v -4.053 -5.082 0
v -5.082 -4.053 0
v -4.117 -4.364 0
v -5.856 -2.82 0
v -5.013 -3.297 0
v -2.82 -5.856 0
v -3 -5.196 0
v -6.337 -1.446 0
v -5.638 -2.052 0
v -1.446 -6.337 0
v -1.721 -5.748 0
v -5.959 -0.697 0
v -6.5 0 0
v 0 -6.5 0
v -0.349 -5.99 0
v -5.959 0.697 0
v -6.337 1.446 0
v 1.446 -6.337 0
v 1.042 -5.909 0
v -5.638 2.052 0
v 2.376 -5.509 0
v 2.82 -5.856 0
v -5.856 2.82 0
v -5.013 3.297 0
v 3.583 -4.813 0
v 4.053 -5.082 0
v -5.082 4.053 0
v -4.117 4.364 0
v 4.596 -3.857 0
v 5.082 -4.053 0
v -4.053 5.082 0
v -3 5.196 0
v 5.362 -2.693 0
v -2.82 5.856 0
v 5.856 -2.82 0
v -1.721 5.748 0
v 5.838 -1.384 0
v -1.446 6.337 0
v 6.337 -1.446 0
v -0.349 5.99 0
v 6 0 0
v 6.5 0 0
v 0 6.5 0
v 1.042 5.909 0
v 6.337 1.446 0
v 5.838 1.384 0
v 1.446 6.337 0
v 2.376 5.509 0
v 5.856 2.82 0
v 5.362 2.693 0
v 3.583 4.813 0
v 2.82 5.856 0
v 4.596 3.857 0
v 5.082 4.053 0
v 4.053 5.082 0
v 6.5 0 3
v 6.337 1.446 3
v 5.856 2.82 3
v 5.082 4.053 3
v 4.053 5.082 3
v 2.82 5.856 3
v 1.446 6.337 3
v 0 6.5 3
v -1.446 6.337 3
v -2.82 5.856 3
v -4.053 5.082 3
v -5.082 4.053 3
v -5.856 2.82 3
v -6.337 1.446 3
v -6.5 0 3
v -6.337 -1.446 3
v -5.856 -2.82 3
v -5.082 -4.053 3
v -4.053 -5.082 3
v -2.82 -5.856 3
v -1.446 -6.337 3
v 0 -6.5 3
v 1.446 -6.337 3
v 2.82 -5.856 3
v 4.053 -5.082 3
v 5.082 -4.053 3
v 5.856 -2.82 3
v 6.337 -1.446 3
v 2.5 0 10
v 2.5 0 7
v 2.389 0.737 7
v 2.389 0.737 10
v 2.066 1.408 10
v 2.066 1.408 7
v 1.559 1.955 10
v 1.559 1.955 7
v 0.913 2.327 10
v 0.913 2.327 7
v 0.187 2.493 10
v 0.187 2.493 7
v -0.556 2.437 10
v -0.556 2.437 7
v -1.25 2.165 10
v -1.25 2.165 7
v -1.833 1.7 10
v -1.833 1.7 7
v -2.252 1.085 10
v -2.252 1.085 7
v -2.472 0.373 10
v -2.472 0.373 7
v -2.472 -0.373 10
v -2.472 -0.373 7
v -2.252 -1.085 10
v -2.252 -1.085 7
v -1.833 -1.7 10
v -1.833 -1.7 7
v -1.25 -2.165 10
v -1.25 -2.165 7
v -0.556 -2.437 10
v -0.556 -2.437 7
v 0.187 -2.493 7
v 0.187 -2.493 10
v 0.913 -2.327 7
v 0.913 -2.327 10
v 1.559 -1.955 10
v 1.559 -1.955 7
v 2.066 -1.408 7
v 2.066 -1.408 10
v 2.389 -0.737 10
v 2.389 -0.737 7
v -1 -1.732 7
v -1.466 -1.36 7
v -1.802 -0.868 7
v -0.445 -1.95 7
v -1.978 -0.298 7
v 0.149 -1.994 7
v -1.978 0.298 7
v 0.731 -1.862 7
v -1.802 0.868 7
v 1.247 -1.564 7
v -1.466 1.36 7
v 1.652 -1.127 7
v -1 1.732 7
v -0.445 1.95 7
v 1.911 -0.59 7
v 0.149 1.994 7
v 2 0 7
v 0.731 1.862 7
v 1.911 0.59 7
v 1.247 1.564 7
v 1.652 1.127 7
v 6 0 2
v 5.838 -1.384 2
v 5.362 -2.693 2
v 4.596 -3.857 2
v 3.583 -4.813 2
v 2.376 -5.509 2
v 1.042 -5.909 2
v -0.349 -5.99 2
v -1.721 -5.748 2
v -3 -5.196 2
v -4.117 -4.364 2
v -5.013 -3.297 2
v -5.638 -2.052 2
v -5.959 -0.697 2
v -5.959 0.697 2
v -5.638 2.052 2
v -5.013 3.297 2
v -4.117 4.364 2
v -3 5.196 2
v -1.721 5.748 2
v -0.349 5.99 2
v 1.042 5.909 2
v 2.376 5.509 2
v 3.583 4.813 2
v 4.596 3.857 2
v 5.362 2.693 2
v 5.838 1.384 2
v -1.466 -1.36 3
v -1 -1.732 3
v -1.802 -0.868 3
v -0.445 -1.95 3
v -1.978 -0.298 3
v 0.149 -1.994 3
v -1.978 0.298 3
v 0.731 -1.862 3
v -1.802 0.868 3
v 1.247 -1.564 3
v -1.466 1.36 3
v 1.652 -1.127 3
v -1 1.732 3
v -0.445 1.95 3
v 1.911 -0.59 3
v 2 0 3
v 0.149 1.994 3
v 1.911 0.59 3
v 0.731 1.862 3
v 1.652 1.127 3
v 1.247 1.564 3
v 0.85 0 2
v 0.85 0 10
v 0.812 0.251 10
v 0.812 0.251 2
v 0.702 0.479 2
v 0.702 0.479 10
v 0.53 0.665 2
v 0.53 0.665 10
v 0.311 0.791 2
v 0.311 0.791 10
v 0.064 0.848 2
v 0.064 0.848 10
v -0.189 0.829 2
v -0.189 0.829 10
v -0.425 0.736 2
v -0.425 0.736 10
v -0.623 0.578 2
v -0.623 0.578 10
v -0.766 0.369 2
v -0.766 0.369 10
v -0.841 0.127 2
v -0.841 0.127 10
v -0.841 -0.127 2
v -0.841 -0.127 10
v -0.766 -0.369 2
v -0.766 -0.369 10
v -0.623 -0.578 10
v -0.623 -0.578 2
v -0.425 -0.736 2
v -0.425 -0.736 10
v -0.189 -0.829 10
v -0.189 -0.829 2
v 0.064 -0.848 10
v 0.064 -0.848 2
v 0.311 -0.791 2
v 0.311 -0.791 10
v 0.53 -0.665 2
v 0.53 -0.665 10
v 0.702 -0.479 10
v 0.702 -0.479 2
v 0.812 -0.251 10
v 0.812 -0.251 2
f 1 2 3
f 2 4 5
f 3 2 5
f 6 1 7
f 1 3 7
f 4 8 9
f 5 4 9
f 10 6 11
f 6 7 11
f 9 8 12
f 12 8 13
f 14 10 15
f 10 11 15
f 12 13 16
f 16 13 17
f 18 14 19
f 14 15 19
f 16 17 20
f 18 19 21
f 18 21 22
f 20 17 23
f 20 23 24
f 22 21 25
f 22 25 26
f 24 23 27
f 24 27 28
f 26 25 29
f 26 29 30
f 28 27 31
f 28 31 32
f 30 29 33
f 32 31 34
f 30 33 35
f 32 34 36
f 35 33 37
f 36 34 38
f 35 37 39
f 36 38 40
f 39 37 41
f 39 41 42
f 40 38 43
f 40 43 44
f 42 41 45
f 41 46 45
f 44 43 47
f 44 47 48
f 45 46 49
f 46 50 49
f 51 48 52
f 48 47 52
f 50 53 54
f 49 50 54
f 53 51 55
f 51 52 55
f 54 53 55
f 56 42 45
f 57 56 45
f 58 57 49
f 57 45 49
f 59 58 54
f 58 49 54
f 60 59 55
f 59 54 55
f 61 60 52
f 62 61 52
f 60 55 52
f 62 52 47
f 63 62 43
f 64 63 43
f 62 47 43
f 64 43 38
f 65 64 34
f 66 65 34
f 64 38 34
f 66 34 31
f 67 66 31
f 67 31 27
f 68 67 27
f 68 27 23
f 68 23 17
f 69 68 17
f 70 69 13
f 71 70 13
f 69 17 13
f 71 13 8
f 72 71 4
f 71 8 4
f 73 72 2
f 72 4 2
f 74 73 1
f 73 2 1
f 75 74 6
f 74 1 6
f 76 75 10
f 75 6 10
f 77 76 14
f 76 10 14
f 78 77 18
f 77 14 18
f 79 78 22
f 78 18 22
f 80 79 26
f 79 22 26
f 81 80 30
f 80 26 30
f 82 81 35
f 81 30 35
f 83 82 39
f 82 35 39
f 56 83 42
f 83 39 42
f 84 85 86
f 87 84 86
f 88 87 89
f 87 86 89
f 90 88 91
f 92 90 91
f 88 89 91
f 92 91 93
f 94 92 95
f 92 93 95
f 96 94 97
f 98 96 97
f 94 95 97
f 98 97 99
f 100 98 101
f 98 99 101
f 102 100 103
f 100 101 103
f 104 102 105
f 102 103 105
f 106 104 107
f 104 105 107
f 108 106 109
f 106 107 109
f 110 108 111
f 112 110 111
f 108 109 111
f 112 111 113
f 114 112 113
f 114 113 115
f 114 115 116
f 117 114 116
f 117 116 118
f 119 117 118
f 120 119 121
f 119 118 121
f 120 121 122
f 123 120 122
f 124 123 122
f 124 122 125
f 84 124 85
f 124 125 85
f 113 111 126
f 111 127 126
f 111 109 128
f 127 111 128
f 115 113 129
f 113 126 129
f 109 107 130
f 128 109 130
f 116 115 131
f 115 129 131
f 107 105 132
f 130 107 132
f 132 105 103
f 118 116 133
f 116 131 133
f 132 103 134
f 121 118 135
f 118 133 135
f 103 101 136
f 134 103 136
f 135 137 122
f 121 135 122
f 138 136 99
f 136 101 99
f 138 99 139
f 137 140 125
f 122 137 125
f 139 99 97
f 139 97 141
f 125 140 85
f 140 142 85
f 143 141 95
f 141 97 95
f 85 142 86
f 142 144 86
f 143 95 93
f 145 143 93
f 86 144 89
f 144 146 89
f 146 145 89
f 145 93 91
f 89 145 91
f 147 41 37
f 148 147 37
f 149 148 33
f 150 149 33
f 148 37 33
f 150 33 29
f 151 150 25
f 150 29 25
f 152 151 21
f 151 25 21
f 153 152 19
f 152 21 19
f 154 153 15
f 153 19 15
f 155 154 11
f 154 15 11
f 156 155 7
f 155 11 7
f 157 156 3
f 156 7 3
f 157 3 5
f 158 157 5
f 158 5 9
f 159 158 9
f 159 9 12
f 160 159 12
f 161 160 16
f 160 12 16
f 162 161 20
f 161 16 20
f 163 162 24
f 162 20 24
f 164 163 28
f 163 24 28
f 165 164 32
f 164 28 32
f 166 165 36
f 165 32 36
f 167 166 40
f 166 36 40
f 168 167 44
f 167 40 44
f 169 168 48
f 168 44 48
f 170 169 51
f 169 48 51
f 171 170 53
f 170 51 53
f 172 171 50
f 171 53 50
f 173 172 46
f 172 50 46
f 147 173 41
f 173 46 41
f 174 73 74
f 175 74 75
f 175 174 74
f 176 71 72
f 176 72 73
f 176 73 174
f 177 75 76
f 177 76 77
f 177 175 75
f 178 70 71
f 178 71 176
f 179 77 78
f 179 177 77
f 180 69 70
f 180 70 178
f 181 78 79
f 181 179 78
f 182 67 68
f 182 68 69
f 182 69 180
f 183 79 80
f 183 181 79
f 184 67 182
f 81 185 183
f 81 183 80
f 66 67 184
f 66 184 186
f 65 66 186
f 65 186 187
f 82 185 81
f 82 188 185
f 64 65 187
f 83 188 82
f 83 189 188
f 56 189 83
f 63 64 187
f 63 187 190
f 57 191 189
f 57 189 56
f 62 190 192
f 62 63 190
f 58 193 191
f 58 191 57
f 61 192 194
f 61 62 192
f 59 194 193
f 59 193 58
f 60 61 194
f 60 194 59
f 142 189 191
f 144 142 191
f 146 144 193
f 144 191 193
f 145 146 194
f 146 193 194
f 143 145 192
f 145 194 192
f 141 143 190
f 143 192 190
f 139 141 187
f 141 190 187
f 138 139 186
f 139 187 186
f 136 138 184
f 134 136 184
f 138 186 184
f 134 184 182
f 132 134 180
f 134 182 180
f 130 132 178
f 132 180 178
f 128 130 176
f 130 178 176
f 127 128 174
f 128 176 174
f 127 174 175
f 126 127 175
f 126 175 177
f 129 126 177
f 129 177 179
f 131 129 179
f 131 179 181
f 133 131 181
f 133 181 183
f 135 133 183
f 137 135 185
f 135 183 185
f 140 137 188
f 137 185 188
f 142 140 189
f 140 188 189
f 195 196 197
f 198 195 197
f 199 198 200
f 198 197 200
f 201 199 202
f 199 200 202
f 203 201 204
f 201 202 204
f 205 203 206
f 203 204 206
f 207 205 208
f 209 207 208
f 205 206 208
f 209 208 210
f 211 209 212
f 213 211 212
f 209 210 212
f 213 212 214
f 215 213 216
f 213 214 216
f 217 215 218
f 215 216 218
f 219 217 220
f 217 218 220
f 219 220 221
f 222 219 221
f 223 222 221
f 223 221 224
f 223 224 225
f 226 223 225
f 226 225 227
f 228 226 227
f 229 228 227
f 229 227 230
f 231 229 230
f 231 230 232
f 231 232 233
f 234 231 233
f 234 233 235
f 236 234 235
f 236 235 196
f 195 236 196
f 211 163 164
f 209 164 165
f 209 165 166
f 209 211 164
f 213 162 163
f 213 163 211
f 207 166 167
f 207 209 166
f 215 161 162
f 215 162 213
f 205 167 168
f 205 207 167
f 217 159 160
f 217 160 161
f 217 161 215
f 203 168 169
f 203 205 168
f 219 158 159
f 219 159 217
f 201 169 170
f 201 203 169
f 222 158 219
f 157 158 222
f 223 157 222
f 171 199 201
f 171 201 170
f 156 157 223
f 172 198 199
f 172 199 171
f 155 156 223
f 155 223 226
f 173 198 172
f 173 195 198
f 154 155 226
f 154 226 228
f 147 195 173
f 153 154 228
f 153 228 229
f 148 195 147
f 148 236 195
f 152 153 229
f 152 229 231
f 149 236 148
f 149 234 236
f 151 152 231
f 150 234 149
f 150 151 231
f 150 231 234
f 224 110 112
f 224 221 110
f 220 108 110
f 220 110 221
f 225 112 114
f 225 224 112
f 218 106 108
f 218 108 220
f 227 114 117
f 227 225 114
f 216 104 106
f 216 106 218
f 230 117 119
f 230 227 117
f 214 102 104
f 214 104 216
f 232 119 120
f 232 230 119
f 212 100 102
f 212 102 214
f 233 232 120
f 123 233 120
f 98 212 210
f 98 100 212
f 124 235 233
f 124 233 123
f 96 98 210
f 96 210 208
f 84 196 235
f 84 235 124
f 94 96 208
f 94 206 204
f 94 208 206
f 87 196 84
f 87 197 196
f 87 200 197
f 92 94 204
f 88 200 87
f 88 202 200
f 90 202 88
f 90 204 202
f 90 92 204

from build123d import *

# Parameters (mm, degrees)
F0_R     = 6.5
F1_DEPTH = 3
F2_R     = 2
F3_DEPTH = 4
F4_R     = 2.5
F5_DEPTH = 3
F6_R     = 6
F7_DEPTH = 2
F8_R     = 0.85
F9_DEPTH = 10.001


with BuildPart() as f1:
    # F0 (on Top) → F1 (new body)
    with BuildSketch(Plane.XY):
        Circle(F0_R)
    extrude(amount=F1_DEPTH)

    # F2 (on face) → F3 (join)
    with BuildSketch(Plane.XY.offset(3)):
        Circle(F2_R)
    extrude(amount=F3_DEPTH)

    # F4 (on face) → F5 (join)
    with BuildSketch(Plane.XY.offset(7)):
        Circle(F4_R)
    extrude(amount=F5_DEPTH)

    # F6 (on face) → F7 (cut)
    with BuildSketch(Plane(origin=(0, 0, 0), x_dir=(1, 0, 0), z_dir=(0, 0, -1))):
        Circle(F6_R)
    extrude(amount=-F7_DEPTH, mode=Mode.SUBTRACT)

    # F8 (on face) → F9 (cut, through all)
    with BuildSketch(Plane.XY.offset(10)):
        Circle(F8_R)
    extrude(amount=-F9_DEPTH, mode=Mode.SUBTRACT)


solid = f1.part
